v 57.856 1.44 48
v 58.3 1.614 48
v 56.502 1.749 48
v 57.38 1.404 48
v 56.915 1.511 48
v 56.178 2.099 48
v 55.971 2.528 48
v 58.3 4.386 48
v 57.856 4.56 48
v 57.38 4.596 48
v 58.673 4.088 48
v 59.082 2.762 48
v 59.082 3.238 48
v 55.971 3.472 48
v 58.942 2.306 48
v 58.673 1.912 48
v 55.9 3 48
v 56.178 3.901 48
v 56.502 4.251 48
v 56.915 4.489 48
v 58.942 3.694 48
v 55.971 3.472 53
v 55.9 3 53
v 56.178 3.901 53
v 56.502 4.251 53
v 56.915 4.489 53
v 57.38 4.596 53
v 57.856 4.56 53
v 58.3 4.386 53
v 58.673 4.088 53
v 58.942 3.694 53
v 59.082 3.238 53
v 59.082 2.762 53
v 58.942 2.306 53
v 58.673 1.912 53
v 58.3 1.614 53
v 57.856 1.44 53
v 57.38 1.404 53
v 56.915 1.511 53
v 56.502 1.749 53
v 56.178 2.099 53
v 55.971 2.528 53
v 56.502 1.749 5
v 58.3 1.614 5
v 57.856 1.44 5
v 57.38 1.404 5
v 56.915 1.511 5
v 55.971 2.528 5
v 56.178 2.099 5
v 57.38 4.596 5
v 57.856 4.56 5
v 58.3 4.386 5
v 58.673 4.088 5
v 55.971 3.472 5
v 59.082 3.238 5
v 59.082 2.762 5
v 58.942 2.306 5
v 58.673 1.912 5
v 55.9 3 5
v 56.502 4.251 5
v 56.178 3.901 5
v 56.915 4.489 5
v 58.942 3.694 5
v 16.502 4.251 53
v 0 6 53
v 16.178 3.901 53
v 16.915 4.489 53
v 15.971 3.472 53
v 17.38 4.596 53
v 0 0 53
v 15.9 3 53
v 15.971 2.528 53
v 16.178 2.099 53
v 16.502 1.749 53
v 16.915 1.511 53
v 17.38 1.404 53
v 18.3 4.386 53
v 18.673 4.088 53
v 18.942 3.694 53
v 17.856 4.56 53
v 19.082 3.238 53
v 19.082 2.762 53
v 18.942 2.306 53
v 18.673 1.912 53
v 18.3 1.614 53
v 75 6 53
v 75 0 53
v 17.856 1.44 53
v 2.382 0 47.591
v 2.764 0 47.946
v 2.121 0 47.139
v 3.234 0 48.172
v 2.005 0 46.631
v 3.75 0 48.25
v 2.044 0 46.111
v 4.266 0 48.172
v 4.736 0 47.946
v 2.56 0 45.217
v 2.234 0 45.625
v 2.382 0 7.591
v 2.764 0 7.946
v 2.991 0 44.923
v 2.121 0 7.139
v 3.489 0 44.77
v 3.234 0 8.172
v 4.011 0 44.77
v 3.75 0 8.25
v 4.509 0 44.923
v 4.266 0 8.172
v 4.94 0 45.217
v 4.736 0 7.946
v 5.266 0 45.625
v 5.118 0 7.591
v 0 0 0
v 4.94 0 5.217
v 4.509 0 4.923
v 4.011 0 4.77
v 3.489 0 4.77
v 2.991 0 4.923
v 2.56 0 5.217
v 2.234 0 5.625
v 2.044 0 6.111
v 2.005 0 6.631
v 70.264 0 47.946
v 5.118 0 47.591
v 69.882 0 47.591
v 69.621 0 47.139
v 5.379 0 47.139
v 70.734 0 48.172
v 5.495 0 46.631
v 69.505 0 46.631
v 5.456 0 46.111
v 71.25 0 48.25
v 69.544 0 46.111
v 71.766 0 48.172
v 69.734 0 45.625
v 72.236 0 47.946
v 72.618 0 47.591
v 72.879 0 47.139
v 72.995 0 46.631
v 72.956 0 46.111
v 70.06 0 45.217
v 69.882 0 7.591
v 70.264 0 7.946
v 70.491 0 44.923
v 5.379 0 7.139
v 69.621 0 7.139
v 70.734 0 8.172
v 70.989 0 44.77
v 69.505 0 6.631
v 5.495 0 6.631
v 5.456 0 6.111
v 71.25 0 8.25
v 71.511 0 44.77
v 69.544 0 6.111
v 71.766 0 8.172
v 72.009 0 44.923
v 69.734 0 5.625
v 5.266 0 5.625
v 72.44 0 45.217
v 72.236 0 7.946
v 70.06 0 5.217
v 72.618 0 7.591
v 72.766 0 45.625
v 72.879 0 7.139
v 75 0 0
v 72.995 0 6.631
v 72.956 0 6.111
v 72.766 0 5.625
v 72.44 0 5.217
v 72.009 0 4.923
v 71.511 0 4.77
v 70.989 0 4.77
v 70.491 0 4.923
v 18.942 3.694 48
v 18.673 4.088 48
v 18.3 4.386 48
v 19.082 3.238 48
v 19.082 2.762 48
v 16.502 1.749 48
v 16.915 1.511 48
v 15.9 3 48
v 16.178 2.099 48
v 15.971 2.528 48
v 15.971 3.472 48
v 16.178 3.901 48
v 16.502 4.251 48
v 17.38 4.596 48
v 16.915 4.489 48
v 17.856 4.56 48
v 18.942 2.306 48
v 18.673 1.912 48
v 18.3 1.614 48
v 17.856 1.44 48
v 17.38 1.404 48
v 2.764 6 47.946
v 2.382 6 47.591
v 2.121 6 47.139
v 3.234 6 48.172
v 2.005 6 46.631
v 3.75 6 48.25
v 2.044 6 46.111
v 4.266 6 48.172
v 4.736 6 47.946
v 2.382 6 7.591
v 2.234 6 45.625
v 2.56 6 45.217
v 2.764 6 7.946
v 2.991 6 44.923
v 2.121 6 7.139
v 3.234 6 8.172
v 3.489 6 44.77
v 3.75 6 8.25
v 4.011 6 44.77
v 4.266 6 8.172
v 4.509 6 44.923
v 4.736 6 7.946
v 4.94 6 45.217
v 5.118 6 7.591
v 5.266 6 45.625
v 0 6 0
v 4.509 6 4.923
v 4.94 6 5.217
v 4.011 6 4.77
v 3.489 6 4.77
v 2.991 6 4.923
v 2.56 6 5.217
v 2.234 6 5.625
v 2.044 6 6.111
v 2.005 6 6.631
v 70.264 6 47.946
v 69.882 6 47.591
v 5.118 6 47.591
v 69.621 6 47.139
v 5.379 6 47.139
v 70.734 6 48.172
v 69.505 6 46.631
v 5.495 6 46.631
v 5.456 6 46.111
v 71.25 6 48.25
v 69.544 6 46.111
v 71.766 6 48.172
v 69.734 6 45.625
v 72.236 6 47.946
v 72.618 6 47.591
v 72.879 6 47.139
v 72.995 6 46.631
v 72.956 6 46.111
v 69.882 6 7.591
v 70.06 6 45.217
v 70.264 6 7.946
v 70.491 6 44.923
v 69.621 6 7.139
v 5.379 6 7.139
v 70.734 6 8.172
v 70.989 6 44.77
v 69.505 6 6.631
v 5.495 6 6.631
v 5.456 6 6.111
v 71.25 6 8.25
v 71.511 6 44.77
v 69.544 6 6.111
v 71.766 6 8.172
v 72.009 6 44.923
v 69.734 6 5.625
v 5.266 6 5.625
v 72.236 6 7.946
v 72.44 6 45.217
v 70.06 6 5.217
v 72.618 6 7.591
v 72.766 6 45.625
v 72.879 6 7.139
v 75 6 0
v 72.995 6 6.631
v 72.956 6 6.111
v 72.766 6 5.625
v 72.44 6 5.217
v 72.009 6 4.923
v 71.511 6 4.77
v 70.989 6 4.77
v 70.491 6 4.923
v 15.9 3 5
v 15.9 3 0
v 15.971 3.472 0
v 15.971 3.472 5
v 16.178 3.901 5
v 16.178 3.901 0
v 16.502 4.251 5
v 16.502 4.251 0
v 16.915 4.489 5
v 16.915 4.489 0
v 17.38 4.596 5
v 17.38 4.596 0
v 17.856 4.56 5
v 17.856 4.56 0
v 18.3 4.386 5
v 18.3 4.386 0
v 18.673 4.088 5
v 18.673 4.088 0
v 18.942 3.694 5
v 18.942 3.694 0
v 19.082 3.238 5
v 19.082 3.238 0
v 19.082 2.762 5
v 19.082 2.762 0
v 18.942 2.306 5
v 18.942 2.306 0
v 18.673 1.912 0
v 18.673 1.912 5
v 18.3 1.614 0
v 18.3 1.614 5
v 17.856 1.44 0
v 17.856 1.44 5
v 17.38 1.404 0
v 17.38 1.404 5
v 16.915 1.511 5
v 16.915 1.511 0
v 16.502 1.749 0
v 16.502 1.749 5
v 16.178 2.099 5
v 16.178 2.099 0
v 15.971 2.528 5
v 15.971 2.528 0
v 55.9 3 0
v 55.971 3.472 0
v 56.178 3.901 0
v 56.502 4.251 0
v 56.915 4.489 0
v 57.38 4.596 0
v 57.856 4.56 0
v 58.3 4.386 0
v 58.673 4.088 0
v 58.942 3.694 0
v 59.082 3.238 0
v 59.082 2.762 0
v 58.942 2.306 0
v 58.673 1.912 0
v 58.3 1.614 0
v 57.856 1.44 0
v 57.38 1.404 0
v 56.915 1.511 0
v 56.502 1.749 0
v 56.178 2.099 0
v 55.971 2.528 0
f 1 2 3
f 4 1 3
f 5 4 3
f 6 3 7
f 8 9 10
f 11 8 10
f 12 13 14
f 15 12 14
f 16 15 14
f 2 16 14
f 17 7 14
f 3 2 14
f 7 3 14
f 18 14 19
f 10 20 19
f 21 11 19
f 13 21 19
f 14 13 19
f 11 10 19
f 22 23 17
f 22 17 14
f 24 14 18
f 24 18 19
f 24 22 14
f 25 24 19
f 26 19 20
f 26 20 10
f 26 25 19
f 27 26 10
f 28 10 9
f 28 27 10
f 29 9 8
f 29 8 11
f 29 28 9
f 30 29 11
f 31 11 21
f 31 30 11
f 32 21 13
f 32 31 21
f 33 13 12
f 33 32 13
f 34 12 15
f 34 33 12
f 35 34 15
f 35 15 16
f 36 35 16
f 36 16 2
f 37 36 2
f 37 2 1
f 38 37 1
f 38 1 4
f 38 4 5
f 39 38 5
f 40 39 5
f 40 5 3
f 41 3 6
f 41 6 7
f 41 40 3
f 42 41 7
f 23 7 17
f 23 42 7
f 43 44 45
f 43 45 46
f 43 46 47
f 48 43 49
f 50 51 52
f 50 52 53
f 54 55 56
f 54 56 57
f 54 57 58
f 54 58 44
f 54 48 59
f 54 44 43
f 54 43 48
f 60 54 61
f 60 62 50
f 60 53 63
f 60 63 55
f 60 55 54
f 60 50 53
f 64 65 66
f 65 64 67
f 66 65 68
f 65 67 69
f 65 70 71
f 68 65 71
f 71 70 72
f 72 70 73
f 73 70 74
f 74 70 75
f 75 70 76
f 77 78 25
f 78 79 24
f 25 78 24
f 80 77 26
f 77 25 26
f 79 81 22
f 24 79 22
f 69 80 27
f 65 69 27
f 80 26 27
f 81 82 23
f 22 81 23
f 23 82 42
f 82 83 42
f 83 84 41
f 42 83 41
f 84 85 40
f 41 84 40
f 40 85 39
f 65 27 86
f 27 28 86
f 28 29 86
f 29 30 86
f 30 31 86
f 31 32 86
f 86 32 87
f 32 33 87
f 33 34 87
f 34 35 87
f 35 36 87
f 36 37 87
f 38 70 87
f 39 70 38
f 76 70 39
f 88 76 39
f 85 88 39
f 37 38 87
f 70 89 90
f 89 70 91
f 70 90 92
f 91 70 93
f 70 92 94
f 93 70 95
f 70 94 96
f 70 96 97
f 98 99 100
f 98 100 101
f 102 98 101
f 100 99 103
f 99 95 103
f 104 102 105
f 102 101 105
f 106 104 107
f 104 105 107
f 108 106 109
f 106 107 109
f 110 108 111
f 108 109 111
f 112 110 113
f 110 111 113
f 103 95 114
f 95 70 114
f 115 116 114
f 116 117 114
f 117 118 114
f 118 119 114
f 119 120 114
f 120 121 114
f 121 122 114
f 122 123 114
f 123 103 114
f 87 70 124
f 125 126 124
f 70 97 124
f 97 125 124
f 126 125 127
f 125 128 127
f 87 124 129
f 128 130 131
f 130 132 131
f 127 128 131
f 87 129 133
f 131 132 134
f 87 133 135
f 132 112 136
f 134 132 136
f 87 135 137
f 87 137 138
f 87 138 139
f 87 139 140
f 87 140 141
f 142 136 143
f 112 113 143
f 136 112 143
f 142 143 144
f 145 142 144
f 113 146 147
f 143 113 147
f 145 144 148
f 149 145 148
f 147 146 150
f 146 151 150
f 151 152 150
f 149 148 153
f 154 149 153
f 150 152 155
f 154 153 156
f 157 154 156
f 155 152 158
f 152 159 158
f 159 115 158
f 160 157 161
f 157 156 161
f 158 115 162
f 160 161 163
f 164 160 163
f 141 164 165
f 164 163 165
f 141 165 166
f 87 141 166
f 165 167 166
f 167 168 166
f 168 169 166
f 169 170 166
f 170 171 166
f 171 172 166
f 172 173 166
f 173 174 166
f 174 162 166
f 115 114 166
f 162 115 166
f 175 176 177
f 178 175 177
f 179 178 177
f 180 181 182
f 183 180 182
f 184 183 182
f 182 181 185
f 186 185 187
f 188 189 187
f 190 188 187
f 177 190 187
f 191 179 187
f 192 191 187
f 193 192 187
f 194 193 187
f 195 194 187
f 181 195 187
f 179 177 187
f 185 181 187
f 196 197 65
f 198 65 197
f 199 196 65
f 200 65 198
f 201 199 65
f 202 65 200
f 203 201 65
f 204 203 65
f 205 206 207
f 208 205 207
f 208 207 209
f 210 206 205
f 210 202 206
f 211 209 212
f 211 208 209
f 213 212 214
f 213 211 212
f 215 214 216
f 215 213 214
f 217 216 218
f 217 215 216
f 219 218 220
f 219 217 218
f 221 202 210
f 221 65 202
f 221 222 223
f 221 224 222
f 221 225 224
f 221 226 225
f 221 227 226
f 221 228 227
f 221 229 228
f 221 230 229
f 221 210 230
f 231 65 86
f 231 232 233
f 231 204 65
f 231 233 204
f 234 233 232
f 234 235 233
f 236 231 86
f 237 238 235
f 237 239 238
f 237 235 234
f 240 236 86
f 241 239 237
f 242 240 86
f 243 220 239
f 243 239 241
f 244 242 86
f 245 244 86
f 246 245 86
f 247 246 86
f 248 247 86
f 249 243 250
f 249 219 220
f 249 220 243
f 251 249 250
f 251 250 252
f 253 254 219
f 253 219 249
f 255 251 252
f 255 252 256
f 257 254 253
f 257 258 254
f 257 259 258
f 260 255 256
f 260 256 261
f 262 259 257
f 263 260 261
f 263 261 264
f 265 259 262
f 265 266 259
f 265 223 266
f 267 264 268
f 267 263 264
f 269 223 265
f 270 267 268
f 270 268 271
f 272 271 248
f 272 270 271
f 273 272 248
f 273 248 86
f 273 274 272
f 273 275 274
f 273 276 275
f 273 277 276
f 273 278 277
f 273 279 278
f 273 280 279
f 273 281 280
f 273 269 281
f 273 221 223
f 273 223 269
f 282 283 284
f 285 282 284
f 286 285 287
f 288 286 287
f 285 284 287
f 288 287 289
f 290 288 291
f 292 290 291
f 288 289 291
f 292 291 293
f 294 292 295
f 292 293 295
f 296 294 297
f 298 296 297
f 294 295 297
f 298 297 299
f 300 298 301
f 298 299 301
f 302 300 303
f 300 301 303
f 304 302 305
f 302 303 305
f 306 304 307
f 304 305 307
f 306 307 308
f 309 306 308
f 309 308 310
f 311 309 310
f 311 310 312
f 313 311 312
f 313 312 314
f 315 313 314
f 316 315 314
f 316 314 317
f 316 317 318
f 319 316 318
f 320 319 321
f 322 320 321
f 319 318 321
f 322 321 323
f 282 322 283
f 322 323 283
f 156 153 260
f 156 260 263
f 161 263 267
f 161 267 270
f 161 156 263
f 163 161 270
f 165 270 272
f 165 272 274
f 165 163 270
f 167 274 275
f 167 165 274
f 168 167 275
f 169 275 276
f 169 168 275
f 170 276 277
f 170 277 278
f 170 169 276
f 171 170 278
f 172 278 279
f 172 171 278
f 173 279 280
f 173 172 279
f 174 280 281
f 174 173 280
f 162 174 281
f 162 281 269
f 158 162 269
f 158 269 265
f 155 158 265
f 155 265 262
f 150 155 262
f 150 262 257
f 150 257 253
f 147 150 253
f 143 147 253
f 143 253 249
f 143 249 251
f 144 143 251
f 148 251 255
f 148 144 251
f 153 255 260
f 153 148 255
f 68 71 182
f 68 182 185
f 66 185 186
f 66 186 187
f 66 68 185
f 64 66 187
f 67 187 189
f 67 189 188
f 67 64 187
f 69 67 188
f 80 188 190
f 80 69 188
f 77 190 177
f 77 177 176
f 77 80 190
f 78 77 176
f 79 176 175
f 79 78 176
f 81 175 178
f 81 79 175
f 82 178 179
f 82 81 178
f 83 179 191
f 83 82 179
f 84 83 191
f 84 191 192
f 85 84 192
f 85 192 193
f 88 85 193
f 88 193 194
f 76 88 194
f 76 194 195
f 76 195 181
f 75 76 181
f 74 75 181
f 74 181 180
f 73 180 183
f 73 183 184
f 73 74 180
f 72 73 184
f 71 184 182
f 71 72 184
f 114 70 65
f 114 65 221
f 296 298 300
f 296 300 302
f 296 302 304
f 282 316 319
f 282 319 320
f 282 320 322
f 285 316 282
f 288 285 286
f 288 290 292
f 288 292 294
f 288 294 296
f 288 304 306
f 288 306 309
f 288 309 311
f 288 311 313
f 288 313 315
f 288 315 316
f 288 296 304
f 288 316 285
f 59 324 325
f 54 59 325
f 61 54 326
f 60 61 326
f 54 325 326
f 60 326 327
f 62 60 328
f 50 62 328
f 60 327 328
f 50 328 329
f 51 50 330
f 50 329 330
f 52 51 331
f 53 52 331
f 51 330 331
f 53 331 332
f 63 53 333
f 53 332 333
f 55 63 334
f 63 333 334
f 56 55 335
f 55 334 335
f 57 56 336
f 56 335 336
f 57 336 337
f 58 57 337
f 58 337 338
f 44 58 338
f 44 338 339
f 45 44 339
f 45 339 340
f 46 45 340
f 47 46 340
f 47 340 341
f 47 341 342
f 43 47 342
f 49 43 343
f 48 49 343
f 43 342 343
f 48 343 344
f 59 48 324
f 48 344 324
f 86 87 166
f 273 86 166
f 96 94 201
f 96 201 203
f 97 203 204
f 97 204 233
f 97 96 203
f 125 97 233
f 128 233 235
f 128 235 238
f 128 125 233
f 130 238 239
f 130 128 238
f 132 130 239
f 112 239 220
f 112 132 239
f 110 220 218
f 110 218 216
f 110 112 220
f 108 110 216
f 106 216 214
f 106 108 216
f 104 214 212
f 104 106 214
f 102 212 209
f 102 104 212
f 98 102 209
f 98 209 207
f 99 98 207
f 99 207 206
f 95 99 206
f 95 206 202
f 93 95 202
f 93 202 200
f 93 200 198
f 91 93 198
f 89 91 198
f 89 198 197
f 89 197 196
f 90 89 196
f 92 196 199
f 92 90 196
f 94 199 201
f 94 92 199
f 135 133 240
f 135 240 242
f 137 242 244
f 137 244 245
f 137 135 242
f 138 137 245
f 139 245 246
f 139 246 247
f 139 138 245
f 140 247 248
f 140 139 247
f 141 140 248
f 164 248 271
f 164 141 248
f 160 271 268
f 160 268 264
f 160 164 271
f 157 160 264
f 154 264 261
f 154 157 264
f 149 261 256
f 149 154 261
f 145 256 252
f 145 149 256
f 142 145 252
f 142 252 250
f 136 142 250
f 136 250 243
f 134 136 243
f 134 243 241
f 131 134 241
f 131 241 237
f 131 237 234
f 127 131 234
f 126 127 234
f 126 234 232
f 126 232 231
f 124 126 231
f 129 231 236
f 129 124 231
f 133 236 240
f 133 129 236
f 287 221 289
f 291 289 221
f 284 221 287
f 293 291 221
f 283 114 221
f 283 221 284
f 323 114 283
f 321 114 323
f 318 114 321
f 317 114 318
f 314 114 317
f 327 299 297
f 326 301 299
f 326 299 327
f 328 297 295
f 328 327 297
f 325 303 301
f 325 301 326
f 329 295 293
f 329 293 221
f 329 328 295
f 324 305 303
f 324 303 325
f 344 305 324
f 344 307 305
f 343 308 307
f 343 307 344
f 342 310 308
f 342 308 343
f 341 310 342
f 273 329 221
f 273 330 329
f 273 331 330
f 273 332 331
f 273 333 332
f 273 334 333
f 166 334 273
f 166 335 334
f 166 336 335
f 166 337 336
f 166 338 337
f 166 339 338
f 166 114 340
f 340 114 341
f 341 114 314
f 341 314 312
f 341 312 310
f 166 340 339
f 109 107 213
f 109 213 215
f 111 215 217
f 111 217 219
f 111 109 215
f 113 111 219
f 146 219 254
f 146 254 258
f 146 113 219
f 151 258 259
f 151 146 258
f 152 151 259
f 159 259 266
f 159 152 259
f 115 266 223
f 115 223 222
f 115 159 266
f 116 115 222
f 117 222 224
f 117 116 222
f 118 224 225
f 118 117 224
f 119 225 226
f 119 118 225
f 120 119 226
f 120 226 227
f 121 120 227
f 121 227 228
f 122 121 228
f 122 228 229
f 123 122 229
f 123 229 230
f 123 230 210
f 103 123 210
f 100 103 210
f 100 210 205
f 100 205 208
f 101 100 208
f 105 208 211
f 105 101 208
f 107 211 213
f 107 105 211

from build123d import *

# Parameters (mm, degrees)
SKETCH1_W           = 75
SKETCH1_H           = 53
SKETCH1_R           = 1.75
BOSS_EXTRUDE8_DEPTH = 6
SKETCH6_R           = 1.6
CUT_EXTRUDE2_DEPTH  = 5


with BuildPart() as part:
    # Sketch1 → Boss-Extrude8 (new body)
    with BuildSketch(Plane(origin=(0, 0, 0), x_dir=(1, 0, 0), z_dir=(0, 1, 0))):
        with Locations((37.5, -26.5)):
            Rectangle(SKETCH1_W, SKETCH1_H)
        with Locations(Location((71.25, -6.5, 0), (0, 0, 270))):
            Circle(SKETCH1_R, mode=Mode.SUBTRACT)
        with Locations(Location((3.75, -6.5, 0), (0, 0, 270))):
            Circle(SKETCH1_R, mode=Mode.SUBTRACT)
        with Locations(Location((71.25, -46.5, 0), (0, 0, 270))):
            Circle(SKETCH1_R, mode=Mode.SUBTRACT)
        with Locations(Location((3.75, -46.5, 0), (0, 0, 270))):
            Circle(SKETCH1_R, mode=Mode.SUBTRACT)
    extrude(amount=BOSS_EXTRUDE8_DEPTH)

    # Sketch6 → Cut-Extrude2 (cut)
    with BuildSketch(Plane(origin=(0, 0, 0), x_dir=(-1, 0, 0), z_dir=(0, 0, -1))):
        with Locations((-57.5, 3)):
            Circle(SKETCH6_R)
        with Locations((-17.5, 3)):
            Circle(SKETCH6_R)
    cut_extrude2 = extrude(amount=-CUT_EXTRUDE2_DEPTH, mode=Mode.SUBTRACT)

    # Mirror1: Cut-Extrude2 across plane
    add(cut_extrude2.mirror(Plane.XY.offset(26.5)), mode=Mode.SUBTRACT)


solid = part.part
